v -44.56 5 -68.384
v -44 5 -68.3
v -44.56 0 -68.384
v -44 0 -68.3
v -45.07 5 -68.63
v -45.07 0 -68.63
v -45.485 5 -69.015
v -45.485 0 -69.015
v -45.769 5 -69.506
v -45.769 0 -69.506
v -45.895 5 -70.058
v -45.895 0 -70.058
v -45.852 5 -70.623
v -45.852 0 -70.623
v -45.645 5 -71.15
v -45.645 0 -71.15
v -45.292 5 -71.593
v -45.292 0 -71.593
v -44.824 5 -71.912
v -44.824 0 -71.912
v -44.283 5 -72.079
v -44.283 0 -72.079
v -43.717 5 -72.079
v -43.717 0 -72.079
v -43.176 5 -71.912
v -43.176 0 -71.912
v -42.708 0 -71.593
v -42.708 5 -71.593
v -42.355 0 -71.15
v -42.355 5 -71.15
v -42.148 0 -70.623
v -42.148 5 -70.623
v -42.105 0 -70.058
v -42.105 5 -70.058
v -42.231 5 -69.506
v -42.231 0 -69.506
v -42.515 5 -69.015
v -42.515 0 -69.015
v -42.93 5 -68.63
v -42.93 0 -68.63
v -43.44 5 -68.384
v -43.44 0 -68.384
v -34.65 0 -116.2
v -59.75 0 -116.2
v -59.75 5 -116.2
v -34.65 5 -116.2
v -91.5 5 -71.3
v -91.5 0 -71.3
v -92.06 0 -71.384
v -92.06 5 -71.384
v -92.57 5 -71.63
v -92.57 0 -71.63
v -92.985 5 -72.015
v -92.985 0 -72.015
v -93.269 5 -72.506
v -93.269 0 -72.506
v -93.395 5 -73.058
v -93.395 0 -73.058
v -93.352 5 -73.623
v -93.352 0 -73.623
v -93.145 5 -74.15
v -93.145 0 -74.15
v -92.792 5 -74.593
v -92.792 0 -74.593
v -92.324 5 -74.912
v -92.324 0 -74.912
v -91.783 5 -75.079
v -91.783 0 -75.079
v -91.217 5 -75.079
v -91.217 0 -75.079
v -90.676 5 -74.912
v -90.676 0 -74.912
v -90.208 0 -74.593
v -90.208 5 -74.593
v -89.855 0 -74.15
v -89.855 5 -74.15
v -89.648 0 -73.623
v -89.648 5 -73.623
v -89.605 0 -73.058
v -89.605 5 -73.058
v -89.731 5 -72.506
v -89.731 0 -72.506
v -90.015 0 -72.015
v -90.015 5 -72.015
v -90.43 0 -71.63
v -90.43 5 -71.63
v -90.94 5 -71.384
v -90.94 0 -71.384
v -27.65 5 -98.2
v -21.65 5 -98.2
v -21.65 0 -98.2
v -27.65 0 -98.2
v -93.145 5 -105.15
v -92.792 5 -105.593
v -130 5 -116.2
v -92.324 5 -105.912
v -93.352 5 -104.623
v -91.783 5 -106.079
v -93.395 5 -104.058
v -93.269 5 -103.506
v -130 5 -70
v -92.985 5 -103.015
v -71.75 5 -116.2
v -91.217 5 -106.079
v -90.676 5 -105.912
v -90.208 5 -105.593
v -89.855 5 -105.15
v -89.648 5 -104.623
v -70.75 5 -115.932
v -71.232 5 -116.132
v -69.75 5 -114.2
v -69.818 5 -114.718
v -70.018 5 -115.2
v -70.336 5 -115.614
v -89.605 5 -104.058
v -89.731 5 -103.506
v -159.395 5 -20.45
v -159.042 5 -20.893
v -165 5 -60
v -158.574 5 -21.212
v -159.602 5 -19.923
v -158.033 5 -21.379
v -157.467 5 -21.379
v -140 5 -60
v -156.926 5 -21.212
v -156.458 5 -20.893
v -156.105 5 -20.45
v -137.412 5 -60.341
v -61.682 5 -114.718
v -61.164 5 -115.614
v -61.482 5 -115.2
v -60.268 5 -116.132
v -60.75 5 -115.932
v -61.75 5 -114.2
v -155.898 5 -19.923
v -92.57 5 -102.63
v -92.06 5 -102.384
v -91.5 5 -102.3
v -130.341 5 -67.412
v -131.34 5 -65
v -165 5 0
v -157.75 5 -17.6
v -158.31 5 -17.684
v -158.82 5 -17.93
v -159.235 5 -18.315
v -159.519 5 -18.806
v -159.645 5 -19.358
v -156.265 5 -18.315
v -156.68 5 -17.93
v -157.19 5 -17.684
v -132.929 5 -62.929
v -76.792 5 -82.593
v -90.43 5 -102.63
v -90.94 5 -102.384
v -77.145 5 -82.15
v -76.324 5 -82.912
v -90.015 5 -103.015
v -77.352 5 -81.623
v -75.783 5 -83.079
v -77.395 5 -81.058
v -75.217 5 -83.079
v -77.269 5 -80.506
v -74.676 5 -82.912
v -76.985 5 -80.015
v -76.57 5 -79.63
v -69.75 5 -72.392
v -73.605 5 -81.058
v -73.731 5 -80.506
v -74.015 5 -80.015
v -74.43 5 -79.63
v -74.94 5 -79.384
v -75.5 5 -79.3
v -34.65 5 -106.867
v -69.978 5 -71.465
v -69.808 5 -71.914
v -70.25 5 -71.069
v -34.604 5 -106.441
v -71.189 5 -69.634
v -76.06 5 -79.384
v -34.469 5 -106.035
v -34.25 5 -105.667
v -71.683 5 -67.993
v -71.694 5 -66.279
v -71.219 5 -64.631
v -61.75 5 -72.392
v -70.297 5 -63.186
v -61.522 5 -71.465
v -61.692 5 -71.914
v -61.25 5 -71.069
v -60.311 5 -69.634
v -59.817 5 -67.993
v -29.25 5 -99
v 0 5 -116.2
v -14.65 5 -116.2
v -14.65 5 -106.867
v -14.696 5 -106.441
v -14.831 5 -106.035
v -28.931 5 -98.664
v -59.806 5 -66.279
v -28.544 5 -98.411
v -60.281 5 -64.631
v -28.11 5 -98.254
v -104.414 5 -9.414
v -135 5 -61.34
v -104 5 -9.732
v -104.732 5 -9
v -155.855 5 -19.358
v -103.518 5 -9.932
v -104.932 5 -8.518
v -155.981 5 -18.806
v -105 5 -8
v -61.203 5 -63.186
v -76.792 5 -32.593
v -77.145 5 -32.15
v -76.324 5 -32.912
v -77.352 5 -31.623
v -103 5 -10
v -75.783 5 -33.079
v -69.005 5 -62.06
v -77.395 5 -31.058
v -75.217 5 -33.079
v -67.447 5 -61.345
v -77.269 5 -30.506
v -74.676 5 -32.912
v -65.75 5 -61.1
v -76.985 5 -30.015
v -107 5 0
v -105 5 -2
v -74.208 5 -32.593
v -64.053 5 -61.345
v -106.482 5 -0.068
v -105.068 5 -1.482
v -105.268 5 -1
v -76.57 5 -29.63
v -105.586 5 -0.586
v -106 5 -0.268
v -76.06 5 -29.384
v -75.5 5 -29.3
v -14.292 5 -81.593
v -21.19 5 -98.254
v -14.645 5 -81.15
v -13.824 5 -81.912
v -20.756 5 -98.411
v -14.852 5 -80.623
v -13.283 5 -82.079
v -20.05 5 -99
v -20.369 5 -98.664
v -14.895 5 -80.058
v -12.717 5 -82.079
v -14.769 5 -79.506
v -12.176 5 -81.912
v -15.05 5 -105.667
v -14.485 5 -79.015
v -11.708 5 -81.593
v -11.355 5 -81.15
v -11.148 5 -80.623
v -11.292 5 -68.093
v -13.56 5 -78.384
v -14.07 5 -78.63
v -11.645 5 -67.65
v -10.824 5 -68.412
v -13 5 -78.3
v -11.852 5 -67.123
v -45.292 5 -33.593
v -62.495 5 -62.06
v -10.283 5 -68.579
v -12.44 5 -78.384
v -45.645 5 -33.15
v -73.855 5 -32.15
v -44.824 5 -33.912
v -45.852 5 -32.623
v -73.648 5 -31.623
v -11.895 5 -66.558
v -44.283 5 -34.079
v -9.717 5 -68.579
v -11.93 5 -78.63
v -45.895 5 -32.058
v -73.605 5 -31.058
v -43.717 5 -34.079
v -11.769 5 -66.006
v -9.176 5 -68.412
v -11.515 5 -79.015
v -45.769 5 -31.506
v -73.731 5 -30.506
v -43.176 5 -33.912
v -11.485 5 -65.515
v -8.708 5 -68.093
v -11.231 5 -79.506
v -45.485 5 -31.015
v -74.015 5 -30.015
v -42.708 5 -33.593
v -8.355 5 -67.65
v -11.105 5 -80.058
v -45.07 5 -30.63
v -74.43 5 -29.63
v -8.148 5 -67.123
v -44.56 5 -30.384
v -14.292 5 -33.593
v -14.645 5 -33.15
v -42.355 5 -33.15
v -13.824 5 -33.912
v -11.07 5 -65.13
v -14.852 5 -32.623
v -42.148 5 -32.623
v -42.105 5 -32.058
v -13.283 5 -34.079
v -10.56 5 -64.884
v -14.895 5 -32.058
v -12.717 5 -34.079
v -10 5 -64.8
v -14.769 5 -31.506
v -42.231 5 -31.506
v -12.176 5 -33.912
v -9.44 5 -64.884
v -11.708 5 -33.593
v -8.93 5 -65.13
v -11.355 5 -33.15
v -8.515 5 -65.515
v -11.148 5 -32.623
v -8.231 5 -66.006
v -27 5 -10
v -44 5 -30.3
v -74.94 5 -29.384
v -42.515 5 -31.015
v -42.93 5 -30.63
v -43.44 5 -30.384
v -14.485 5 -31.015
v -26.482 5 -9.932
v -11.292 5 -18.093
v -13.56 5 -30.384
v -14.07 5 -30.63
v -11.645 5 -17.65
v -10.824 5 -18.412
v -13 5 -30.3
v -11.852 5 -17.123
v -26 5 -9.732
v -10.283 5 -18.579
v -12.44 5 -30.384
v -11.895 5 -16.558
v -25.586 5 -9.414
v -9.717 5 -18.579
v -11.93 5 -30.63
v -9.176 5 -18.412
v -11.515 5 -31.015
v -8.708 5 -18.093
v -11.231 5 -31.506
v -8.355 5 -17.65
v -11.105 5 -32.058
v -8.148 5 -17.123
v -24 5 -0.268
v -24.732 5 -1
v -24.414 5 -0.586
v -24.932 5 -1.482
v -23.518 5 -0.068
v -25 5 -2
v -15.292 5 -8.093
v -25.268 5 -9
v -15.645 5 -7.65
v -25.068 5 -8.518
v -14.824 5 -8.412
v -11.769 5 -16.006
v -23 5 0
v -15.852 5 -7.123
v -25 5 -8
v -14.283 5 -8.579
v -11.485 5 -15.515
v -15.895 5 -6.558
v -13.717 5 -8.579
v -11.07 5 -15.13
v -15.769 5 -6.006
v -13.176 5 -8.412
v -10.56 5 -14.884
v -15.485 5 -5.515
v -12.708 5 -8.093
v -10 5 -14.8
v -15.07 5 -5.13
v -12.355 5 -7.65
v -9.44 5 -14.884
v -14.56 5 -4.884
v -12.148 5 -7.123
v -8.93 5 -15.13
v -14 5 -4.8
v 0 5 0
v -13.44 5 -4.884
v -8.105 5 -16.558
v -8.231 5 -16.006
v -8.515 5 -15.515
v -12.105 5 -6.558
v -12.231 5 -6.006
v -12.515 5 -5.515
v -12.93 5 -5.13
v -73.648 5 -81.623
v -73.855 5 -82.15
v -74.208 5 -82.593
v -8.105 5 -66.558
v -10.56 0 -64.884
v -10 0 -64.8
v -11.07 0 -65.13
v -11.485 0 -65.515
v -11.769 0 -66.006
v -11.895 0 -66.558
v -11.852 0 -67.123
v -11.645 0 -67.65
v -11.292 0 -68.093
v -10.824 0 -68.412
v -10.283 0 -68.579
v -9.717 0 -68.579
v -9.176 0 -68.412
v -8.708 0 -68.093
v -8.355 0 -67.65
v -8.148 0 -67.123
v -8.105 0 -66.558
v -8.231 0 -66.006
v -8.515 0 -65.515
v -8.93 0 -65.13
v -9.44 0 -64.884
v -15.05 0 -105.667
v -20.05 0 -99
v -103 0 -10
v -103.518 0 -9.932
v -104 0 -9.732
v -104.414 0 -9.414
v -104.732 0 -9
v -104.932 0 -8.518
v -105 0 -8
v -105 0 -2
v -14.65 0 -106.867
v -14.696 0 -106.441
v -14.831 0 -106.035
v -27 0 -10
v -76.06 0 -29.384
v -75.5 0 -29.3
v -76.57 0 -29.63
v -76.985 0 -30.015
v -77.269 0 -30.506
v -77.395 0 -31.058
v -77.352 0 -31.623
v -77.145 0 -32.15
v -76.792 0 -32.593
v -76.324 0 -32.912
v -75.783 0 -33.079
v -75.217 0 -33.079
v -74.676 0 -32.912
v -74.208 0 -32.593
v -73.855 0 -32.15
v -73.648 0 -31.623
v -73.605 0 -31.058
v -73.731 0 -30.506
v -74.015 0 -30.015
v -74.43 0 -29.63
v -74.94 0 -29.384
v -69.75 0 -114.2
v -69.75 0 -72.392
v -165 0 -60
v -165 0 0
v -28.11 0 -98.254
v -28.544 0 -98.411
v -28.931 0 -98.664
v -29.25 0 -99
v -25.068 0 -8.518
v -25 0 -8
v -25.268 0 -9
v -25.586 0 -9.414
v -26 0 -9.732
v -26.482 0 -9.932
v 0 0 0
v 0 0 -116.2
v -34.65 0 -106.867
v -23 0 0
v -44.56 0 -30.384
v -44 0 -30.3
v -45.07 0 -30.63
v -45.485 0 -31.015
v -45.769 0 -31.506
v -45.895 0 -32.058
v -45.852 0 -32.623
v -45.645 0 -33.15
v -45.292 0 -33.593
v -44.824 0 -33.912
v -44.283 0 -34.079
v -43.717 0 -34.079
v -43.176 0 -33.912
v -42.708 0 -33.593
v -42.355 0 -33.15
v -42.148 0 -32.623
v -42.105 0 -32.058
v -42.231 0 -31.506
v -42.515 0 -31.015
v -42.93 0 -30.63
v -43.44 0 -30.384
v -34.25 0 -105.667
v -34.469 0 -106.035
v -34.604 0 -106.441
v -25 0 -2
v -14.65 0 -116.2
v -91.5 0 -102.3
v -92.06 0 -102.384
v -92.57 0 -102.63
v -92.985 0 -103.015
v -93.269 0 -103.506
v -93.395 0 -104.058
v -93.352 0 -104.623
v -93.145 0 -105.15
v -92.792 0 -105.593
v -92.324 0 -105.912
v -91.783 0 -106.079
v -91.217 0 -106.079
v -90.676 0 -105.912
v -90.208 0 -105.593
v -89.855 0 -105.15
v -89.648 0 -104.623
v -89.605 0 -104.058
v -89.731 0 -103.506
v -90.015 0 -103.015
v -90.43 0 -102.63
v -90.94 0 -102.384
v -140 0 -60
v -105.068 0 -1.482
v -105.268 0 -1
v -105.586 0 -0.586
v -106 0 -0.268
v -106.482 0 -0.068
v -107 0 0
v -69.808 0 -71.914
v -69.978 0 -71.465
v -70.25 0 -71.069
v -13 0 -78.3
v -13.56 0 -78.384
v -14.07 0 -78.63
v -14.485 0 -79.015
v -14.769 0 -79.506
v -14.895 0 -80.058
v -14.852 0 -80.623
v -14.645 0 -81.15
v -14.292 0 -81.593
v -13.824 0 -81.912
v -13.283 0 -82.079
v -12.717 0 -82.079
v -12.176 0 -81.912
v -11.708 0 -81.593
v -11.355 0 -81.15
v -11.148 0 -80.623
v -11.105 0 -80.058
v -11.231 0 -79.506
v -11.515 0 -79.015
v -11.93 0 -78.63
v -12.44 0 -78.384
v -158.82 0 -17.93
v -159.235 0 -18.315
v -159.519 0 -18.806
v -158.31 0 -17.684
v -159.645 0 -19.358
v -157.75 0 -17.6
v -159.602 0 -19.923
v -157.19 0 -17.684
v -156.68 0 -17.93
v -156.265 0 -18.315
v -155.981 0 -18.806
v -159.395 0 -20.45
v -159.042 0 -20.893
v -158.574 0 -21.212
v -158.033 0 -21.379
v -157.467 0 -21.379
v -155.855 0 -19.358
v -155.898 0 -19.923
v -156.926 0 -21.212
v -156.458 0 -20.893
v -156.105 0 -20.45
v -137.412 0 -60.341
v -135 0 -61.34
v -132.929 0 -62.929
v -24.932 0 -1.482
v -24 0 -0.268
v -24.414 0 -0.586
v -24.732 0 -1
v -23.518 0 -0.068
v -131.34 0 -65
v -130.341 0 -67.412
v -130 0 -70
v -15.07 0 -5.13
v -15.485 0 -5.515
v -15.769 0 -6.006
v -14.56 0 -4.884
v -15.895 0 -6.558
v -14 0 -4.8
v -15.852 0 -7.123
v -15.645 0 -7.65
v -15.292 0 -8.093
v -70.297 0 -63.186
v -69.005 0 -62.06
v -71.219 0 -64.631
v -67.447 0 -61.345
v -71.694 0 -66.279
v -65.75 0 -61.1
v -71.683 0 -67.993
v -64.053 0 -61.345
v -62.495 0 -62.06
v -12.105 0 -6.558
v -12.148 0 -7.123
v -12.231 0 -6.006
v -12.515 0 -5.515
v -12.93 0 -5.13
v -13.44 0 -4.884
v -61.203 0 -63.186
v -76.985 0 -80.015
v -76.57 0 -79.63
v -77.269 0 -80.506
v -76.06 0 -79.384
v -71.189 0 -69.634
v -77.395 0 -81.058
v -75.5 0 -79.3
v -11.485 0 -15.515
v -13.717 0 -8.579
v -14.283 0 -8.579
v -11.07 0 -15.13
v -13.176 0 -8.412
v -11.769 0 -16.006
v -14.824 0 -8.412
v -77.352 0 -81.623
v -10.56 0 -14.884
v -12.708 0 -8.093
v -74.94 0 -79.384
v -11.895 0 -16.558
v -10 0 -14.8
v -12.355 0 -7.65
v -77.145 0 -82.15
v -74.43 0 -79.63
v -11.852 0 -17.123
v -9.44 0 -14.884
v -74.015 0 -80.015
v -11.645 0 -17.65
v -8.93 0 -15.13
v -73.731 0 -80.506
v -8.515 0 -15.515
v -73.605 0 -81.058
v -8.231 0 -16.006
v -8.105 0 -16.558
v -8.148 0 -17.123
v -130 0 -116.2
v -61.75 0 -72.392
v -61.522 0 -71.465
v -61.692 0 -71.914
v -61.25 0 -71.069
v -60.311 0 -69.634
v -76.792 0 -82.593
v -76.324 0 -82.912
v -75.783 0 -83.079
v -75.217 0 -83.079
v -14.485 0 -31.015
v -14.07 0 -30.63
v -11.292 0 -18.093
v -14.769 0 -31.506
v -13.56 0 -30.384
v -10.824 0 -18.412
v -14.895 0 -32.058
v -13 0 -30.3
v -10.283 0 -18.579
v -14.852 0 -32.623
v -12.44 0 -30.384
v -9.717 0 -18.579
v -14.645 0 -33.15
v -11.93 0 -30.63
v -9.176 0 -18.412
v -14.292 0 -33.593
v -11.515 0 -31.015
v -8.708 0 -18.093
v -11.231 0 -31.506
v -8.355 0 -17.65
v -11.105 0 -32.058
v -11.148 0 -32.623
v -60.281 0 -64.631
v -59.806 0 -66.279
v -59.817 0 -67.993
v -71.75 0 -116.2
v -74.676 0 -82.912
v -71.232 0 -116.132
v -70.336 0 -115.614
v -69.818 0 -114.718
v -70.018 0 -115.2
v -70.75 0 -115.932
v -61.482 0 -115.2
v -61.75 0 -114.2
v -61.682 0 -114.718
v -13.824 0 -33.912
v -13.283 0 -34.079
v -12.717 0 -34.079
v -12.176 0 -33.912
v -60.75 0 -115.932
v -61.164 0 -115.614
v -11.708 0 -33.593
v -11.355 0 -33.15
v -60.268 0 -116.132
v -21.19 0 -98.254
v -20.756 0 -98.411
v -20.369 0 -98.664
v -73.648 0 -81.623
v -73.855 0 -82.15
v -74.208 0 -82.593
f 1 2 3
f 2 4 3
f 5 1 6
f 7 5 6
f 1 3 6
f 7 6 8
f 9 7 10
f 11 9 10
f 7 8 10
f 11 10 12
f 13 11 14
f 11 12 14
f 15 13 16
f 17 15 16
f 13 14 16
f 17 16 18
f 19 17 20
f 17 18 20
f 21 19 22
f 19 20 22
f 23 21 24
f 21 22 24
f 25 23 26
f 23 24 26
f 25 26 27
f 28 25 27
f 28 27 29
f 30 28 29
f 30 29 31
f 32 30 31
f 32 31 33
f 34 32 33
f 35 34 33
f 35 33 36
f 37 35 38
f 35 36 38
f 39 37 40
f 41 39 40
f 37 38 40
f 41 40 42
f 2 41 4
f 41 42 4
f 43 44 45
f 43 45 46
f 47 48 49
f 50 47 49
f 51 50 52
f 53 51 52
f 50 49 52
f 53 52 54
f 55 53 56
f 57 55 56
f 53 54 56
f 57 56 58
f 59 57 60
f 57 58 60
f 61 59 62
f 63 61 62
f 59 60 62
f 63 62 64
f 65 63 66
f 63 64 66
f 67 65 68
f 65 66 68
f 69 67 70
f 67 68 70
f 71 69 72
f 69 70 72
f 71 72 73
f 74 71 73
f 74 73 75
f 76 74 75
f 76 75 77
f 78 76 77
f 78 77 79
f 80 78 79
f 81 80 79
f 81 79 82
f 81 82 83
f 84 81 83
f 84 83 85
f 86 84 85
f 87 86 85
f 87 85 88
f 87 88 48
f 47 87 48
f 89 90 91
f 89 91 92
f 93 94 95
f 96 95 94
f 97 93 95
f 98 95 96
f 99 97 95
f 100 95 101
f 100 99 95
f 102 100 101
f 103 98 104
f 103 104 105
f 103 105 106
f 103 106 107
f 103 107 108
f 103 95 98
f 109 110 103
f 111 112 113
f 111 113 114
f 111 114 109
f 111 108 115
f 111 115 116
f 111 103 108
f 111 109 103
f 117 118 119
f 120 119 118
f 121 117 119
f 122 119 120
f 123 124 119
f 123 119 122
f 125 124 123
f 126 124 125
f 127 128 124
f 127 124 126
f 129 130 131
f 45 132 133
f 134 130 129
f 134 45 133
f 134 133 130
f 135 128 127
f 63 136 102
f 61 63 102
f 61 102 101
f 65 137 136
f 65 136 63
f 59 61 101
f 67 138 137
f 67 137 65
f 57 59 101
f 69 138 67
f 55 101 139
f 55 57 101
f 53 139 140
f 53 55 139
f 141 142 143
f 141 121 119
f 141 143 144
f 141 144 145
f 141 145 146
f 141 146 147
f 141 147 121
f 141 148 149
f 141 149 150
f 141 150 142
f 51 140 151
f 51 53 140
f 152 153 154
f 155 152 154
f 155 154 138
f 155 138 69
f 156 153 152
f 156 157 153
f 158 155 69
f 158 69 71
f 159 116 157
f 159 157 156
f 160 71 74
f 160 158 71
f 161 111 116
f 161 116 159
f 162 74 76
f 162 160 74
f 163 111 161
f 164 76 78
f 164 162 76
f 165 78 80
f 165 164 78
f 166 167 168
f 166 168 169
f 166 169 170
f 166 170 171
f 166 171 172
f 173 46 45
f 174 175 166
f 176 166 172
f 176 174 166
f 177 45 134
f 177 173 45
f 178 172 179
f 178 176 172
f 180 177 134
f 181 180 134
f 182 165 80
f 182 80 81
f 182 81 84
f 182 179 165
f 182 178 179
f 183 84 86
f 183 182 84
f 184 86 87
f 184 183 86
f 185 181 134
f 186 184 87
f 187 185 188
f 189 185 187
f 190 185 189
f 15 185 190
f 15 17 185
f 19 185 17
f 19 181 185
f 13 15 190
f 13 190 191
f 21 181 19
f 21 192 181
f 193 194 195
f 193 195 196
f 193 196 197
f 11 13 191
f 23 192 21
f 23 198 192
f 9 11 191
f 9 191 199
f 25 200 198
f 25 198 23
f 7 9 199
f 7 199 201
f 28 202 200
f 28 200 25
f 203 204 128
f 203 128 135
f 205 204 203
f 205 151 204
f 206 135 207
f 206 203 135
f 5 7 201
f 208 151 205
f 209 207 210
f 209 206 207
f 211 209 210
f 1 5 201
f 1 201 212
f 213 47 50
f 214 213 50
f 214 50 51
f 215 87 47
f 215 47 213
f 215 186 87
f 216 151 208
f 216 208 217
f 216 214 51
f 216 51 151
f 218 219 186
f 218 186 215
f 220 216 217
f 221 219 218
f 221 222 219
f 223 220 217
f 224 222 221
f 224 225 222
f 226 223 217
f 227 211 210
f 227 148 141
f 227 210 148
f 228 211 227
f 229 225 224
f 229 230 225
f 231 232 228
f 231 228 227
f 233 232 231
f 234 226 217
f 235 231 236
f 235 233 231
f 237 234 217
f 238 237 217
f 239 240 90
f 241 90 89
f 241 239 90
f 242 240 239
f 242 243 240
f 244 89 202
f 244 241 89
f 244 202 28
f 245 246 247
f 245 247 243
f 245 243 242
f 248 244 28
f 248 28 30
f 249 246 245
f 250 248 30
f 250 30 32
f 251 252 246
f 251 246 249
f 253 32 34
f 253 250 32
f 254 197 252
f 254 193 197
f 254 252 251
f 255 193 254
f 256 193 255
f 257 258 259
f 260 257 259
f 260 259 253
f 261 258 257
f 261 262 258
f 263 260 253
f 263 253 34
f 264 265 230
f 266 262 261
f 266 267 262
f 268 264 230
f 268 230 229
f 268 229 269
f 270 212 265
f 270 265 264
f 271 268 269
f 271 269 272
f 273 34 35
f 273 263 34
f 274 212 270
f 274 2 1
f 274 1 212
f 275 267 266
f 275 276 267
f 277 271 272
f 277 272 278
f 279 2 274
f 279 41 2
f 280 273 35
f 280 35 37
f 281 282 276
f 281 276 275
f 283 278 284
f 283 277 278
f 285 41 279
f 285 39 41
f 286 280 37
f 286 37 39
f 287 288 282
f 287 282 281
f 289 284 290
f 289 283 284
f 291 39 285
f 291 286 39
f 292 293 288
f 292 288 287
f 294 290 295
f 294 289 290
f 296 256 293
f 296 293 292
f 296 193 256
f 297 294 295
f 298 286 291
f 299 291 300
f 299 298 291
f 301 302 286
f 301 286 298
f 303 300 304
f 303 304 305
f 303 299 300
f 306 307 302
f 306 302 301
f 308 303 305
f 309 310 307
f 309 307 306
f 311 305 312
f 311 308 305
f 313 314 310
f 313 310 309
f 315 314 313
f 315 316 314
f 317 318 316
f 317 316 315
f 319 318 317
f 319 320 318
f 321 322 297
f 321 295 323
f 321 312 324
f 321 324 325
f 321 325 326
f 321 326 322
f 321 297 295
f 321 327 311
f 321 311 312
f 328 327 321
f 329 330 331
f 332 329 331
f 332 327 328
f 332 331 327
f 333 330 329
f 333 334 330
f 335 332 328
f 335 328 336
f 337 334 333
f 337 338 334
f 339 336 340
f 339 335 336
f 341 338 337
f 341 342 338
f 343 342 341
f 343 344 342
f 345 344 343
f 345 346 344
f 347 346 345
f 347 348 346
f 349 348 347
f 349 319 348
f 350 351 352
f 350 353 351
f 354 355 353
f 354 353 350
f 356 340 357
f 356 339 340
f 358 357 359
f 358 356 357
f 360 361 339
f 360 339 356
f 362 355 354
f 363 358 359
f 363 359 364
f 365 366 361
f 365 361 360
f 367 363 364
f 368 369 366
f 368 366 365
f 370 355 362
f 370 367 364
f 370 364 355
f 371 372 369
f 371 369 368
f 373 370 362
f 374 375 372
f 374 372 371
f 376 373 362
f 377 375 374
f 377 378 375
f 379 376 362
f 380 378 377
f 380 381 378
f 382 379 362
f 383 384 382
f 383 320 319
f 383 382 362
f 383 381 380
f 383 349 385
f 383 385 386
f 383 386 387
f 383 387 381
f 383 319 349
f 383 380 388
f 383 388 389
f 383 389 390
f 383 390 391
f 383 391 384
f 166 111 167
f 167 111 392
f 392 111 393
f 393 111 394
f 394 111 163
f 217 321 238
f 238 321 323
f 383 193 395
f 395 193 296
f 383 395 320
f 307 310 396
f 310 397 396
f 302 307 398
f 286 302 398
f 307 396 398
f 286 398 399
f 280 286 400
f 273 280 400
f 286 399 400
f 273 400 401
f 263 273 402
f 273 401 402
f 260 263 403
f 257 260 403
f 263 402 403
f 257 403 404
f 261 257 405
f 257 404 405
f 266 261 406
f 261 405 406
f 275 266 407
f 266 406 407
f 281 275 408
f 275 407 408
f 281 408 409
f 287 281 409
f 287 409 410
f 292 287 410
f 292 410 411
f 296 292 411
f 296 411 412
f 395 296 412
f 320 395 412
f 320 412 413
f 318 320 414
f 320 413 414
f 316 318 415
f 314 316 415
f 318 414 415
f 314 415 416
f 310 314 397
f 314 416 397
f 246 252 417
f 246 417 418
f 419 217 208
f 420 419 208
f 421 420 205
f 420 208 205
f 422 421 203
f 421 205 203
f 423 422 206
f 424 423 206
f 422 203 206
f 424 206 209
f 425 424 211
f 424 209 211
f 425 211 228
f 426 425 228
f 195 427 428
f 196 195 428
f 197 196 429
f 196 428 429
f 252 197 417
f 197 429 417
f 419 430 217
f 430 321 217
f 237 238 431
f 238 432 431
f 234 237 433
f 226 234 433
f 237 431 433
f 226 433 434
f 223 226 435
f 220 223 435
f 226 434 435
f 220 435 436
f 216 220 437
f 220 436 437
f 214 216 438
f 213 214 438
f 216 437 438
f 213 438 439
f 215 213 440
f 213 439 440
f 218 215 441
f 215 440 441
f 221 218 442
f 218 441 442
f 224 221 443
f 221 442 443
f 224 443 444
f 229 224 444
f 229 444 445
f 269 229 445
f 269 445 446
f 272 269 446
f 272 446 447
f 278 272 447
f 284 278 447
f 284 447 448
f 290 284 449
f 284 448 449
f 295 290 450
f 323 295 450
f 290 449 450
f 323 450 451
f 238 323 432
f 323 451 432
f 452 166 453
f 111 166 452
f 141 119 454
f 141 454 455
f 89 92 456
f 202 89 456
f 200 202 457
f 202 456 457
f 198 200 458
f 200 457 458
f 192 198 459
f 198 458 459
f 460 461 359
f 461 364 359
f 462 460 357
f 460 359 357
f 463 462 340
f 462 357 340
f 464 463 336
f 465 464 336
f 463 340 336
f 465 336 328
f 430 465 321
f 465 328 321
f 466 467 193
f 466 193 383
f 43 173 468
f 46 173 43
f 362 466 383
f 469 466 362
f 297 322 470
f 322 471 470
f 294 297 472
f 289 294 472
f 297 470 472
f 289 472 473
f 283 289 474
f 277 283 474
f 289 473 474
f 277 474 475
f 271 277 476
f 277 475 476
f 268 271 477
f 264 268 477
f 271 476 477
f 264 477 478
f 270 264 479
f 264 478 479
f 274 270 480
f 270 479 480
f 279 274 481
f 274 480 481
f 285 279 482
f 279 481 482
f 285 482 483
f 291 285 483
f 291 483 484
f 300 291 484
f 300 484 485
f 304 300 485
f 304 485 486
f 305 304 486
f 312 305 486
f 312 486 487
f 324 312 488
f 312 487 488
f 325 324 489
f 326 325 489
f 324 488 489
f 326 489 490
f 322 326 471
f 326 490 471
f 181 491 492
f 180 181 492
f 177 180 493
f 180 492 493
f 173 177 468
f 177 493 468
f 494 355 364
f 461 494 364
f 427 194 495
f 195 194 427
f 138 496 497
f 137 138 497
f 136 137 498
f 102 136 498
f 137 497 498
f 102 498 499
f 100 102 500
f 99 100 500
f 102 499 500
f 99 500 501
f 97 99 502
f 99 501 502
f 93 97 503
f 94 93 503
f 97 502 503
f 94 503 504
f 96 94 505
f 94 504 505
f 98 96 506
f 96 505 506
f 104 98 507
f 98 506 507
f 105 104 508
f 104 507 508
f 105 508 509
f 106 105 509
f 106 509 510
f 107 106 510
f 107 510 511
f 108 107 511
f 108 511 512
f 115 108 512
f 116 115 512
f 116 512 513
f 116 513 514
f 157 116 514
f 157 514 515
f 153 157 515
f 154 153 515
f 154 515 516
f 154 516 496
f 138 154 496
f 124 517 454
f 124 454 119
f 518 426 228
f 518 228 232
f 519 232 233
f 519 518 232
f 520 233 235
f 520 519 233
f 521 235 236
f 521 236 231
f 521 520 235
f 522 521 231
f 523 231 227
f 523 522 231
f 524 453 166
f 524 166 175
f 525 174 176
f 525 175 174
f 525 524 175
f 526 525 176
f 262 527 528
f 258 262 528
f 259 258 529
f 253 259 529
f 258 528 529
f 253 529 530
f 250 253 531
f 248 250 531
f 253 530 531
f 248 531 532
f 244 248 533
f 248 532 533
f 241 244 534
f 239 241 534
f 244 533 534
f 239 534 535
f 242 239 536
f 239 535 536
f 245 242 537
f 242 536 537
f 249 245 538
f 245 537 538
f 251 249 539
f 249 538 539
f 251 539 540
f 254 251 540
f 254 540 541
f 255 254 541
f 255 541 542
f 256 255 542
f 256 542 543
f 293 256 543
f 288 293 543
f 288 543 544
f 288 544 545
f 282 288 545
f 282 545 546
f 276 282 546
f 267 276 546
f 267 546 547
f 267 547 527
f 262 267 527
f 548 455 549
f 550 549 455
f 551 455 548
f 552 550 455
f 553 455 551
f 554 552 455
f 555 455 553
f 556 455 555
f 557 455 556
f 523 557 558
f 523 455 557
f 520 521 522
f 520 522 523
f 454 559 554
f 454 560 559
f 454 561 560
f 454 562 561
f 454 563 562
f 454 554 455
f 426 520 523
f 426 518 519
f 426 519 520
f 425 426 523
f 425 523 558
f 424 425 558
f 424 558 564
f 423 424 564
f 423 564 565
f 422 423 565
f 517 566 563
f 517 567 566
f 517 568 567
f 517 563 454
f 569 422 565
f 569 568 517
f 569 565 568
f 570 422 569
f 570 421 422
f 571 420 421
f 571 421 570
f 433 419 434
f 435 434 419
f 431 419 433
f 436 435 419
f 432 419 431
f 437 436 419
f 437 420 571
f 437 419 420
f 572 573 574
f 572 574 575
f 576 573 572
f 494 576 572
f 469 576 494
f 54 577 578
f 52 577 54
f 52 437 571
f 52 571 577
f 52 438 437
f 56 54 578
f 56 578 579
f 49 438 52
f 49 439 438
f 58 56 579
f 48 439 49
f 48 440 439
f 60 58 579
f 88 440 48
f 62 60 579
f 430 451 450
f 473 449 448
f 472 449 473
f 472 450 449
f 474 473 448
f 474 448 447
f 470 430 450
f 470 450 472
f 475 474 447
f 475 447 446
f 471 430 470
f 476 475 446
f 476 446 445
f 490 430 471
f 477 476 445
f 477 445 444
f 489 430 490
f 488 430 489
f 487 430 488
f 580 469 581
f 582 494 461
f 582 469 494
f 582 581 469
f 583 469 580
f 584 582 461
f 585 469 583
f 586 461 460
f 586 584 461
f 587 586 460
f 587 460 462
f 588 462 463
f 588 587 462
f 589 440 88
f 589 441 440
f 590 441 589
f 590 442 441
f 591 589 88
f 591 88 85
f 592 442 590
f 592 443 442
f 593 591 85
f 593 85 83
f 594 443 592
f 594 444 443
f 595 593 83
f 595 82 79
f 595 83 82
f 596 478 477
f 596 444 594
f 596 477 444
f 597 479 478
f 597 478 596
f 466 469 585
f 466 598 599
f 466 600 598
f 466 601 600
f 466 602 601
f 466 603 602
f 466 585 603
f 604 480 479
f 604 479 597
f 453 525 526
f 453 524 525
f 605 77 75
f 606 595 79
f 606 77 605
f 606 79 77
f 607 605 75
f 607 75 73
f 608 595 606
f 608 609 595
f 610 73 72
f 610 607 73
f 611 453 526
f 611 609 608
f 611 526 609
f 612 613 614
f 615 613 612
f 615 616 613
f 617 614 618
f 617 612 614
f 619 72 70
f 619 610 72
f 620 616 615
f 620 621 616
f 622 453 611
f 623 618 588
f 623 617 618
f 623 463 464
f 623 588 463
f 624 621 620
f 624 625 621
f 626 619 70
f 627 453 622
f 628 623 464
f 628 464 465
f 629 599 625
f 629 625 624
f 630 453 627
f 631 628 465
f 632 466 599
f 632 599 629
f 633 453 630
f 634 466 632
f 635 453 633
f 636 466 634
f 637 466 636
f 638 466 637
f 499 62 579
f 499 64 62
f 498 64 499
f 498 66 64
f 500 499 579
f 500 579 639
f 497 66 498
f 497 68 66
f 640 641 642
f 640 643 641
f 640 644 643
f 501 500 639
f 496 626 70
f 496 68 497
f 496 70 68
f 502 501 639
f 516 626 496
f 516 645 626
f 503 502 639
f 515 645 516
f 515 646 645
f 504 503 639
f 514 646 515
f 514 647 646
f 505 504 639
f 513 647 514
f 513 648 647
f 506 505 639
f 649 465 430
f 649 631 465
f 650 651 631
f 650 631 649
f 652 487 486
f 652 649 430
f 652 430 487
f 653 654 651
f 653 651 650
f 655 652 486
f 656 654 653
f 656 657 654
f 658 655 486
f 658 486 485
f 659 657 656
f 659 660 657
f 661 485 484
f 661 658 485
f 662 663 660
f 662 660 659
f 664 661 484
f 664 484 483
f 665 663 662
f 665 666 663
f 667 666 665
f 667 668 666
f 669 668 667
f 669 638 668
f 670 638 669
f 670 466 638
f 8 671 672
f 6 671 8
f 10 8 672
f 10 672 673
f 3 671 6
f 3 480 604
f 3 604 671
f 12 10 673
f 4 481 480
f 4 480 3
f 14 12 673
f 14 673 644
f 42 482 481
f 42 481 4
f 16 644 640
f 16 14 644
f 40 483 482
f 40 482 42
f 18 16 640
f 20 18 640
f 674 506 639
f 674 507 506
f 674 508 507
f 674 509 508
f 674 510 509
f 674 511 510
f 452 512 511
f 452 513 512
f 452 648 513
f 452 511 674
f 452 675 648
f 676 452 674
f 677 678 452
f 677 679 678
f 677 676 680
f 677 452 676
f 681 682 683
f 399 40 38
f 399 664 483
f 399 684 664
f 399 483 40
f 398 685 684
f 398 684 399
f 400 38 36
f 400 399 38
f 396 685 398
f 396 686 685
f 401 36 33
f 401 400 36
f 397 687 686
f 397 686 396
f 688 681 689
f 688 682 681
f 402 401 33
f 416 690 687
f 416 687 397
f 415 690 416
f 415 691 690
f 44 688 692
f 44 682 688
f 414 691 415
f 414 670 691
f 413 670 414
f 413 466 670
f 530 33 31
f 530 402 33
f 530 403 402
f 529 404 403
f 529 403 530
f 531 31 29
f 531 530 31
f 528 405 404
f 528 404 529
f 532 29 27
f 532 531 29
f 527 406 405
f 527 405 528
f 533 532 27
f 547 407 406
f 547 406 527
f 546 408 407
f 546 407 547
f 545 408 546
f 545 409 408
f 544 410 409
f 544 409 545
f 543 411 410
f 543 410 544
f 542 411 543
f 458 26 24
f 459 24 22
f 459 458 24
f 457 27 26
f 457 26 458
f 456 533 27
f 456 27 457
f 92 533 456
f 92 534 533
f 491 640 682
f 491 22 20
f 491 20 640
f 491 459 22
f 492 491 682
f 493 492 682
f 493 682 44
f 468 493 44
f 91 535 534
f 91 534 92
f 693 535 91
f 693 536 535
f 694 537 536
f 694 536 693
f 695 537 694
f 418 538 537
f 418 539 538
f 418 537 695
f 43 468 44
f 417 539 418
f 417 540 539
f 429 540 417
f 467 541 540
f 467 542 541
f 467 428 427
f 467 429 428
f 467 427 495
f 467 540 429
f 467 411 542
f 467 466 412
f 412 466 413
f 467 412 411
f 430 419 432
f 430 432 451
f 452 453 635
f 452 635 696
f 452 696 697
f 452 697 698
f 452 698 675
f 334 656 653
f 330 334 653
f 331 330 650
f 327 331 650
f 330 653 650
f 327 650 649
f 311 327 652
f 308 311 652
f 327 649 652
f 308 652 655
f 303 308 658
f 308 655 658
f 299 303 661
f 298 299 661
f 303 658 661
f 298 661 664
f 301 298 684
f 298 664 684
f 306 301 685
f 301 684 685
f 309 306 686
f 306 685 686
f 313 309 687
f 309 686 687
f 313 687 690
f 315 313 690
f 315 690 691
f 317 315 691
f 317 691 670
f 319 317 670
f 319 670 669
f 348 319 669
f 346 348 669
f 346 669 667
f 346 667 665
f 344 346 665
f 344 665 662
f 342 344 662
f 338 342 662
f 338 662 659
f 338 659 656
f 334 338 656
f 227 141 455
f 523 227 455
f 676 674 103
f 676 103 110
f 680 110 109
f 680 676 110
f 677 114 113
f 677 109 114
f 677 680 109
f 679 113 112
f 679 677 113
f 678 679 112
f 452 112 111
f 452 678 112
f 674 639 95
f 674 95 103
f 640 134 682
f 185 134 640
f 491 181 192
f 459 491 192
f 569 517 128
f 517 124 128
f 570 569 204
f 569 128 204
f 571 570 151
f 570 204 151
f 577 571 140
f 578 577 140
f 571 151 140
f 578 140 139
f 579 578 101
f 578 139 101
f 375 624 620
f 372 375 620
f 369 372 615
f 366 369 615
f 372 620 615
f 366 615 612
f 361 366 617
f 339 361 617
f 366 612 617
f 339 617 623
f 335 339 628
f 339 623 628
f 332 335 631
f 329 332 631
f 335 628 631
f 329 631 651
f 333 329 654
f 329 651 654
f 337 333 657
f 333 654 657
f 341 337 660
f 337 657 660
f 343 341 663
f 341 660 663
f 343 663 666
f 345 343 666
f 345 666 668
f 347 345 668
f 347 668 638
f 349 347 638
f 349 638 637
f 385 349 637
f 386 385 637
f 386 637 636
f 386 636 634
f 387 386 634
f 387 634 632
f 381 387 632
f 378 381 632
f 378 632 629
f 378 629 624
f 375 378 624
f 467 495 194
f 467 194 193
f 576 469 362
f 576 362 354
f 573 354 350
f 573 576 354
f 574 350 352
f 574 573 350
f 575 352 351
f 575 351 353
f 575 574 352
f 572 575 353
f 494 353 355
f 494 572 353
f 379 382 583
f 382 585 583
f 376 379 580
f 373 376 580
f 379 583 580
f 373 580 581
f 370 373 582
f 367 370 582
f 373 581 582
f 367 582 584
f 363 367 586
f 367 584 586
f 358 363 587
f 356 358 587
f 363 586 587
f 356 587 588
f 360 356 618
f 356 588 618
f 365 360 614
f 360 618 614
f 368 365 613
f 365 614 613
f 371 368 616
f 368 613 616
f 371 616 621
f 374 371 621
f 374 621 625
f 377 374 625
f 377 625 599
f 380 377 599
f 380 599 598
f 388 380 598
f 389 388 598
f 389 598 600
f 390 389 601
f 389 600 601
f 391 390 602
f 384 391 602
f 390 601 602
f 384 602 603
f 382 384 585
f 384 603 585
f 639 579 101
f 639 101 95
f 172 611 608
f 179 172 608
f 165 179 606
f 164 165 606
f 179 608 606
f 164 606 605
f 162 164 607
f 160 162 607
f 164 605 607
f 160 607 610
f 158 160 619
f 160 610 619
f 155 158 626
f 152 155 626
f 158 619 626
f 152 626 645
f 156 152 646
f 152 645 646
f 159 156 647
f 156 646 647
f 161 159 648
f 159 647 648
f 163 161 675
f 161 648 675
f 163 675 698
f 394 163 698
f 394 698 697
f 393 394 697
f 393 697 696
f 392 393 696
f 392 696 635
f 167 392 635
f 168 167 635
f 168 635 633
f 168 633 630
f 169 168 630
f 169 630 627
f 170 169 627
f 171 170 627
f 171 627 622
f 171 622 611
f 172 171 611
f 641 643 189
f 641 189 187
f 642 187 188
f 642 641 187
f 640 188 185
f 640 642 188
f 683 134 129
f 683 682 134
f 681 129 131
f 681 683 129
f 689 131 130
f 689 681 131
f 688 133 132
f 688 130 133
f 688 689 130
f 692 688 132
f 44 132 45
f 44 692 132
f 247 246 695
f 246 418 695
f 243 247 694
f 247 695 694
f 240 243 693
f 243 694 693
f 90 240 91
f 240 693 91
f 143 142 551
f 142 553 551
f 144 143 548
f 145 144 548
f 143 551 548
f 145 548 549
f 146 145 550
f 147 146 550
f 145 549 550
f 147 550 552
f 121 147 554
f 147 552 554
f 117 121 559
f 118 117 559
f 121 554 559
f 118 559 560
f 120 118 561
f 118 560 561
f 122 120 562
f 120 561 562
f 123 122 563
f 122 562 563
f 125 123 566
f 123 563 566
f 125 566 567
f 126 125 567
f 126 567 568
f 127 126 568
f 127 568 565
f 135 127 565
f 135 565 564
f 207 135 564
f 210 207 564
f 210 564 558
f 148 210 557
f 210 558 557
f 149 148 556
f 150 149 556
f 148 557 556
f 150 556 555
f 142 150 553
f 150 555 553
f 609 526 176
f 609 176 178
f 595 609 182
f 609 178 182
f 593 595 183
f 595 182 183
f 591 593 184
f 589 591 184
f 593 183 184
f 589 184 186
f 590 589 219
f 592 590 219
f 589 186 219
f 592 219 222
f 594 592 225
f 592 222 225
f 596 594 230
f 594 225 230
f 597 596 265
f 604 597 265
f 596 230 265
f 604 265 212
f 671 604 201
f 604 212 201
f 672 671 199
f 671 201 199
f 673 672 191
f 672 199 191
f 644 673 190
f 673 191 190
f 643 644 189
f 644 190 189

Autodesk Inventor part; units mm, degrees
ref_plane "YZ Plane" through (0, 0, 0) normal (1, 0, 0) x (0, 1, 0)
ref_plane "XZ Plane" through (0, 0, 0) normal (0, 1, 0) x (-1, 0, 0)
ref_plane "XY Plane" through (0, 0, 0) normal (0, 0, 1) x (1, 0, 0)
sketch "Sketch1" plane through (0, 0, 0) normal (0, 1, 0) x (-1, 0, 0)
  line L0 (0, 0) -> (130, 0)
  line L1 (130, 0) -> (130, -116.2)
  line L2 (130, -116.2) -> (0, -116.2)
  line L3 (0, -116.2) -> (0, 0)
  dimension "d0" = 130
  dimension "d1" = 116.2
extrude "Extrusion1" add sketch "Sketch1" along normal blind 5
sketch "Sketch2" plane through (0, 5, 0) normal (0, 1, 0) x (1, 0, 0)
  line L0 (-10, -25.3077) -> (-10, 177.8334) construction
  line L1 (0, 0) -> (0, 116.2) construction
  line L2 (-130, 0) -> (0, 0) construction
  line L3 (-47, -19.5328) -> (-47, 162.8865) construction
  line L4 (0, 116.2) -> (-130, 116.2) construction
  point P0 (-10, 16.7)
  point P1 (-10, 66.7)
  point P2 (-47, 111.7)
  point P3 (-47, 43.95)
  point P4 (-47, 17.95)
  dimension "d4" = 10
  dimension "d5" = 16.7
  dimension "d6" = 50
  dimension "d7" = 47
  dimension "d8" = 4.5
  dimension "d9" = 72.25
  dimension "d10" = 98.25
hole "Hole1" at (-10, 5, -16.7) at (-10, 5, -66.7) direction (0, -1, 0) diameter 3.8 end through all
sketch "Sketch3" plane through (0, 5, 0) normal (0, 1, 0) x (1, 0, 0)
  line L0 (-105, 0) -> (-25, 0)
  line L1 (-25, 0) -> (-25, 8)
  line L2 (-27, 10) -> (-103, 10)
  line L3 (-105, 8) -> (-105, 0)
  line L4 (-130, 116.2) -> (-130, 0) projected
  line L5 (0, 0) -> (0, 116.2) projected
  arc A0 (-103, 10) -> (-105, 8) centre (-103, 8) ccw
  arc A1 (-25, 8) -> (-27, 10) centre (-27, 8) ccw
  dimension "d18" = 10
  dimension "d19" = 25
  dimension "d20" = 25
  dimension "d21" = 2
extrude "Extrusion2" cut sketch "Sketch3" against normal blind 5
fillet "Fillet1" radius 2 2 edges at (-105, 2.5, 0) (-25, 2.5, 0)
sketch "Sketch4" plane through (0, 5, 0) normal (0, 1, 0) x (1, 0, 0)
  circle A0 centre (-65.75, 67.1) radius 6
  line L0 (0, 0) -> (0, 116.2) projected
  line L1 (-23, 0) -> (0, 0) projected
  dimension "d25" = 12
  dimension "d26" = 65.75
  dimension "d27" = 67.1
extrude "Extrusion3" cut sketch "Sketch4" against normal blind 5
sketch "Sketch5" plane through (0, 5, 0) normal (0, 1, 0) x (1, 0, 0)
  line L0 (-91.5, 130.6682) -> (-91.5, -27.2079) construction
  line L1 (0, 0) -> (0, 116.2) construction
  line L2 (0, 116.2) -> (-130, 116.2) construction
  point P0 (-91.5, 104.2)
  point P1 (-91.5, 73.2)
  dimension "d30" = 91.5
  dimension "d31" = 12
  dimension "d32" = 43
hole "Hole2" at (-91.5, 5, -104.2) at (-91.5, 5, -73.2) direction (0, -1, 0) diameter 3.8 end through all
sketch "Sketch6" plane through (0, 5, 0) normal (0, 1, 0) x (1, 0, 0)
  line L0 (-13, 148.9997) -> (-13, -38.8385) construction
  line L1 (0, 0) -> (0, 116.2) projected
  line L2 (0, 116.2) -> (-130, 116.2) projected
  line L3 (-44, 144.1508) -> (-44, -38.8385) construction
  line L4 (-14, 12.9628) -> (-14, -11.5017) construction
  line L5 (-23, 0) -> (0, 0) construction
  point P0 (-13, 80.2)
  point P1 (-13, 32.2)
  point P2 (-44, 70.2)
  point P3 (-44, 32.2)
  point P4 (-14, 6.7)
  dimension "d40" = 13
  dimension "d41" = 36
  dimension "d42" = 84
  dimension "d50" = 44
  dimension "d51" = 46
  dimension "d52" = 84
  dimension "d53" = 14
  dimension "d54" = 6.7
hole "Hole3" at (-13, 5, -80.2) at (-13, 5, -32.2) at (-44, 5, -32.2) at (-44, 5, -70.2) at (-14, 5, -6.7) direction (0, -1, 0) diameter 3.8 end through all
sketch "Sketch7" plane through (-130, 0, -116.2) normal (-1, 0, 0) x (0, 0, 1)
  line L0 (116.2, 0) -> (56.2, 0)
  line L1 (56.2, 0) -> (56.2, 5)
  line L2 (56.2, 5) -> (116.2, 5)
  line L3 (116.2, 5) -> (116.2, 0)
  dimension "d55" = 60
  dimension "d56" = 5
extrude "Extrusion4" add sketch "Sketch7" along normal blind 35
fillet "Fillet2" radius 10 1 edges at (-130, 2.5, -60)
sketch "Sketch8" plane through (0, 5, 0) normal (0, 1, 0) x (1, 0, 0)
  line L0 (-107, 0) -> (-165, 0) projected
  line L1 (-165, 0) -> (-165, 60) projected
  point P0 (0, 0)
  point P1 (-157.75, 19.5)
  dimension "d60" = 19.5
  dimension "d61" = 7.25
hole "Hole4" at (-157.75, 5, -19.5) direction (0, -1, 0) diameter 3.8 end through all
sketch "Sketch9" plane through (0, 5, 0) normal (0, 1, 0) x (1, 0, 0)
  line L0 (-24.65, 135.1246) -> (-24.65, 98.3323) construction
  line L1 (0, 0) -> (0, 116.2) projected
  line L2 (-34.65, 134.2) -> (-14.65, 134.2)
  line L3 (-14.65, 134.2) -> (-14.65, 98.2)
  line L4 (-14.65, 98.2) -> (-34.65, 98.2)
  line L5 (-34.65, 98.2) -> (-34.65, 134.2)
  line L6 (0, 116.2) -> (-130, 116.2) projected
  line L7 (-34.65, 134.2) -> (-14.65, 98.2) construction
  line L8 (-14.65, 134.2) -> (-34.65, 98.2) construction
  line L9 (-14.65, 106.2) -> (-20.65, 98.2)
  line L10 (-34.65, 106.2) -> (-28.65, 98.2)
  line L11 (-34.65, 116.2) -> (-14.65, 116.2)
  point P0 (-24.65, 116.2)
  dimension "d69" = 24.65
  dimension "d70" = 20
  dimension "d71" = 36
  dimension "d72" = 10
  dimension "d73" = 8
extrude "Extrusion5" cut sketch "Sketch9" against normal through all contours L6 L3 L9 L4 L10 L5
fillet "Fillet3" radius 2 4 edges at (-34.65, 2.5, -106.2) (-28.65, 2.5, -98.2) (-20.65, 2.5, -98.2) (-14.65, 2.5, -106.2)
sketch "Sketch10" plane through (0, 5, 0) normal (0, 1, 0) x (1, 0, 0)
  line L0 (-34.65, 106.8667) -> (-34.65, 116.2) projected
  line L1 (-34.65, 116.2) -> (-130, 116.2) projected
  line L2 (-130, 116.2) -> (-130, 70) projected
  arc A0 (-140, 60) -> (-130, 70) centre (-140, 70) ccw projected
  line L3 (-140, 60) -> (-165, 60) projected
  line L4 (-165, 0) -> (-165, 60) projected
  line L5 (-107, 0) -> (-165, 0) projected
  arc A1 (-107, 0) -> (-105, 2) centre (-107, 2) ccw projected
  line L6 (-105, 2) -> (-105, 8) projected
  arc A2 (-103, 10) -> (-105, 8) centre (-103, 8) ccw projected
  line L7 (-103, 10) -> (-27, 10) projected
  arc A3 (-25, 8) -> (-27, 10) centre (-27, 8) ccw projected
  line L8 (-25, 8) -> (-25, 2) projected
  arc A4 (-25, 2) -> (-23, 0) centre (-23, 2) ccw projected
  line L9 (-23, 0) -> (0, 0) projected
  line L10 (0, 0) -> (0, 116.2) projected
  line L11 (0, 116.2) -> (-14.65, 116.2) projected
  line L12 (-14.65, 116.2) -> (-14.65, 106.8667) projected
  arc A5 (-15.05, 105.6667) -> (-14.65, 106.8667) centre (-16.65, 106.8667) ccw projected
  line L13 (-15.05, 105.6667) -> (-20.05, 99) projected
  arc A6 (-21.65, 98.2) -> (-20.05, 99) centre (-21.65, 100.2) ccw projected
  line L14 (-21.65, 98.2) -> (-27.65, 98.2) projected
  arc A7 (-29.25, 99) -> (-27.65, 98.2) centre (-27.65, 100.2) ccw projected
  line L15 (-29.25, 99) -> (-34.25, 105.6667) projected
  arc A8 (-34.65, 106.8667) -> (-34.25, 105.6667) centre (-32.65, 106.8667) ccw projected
  circle A9 centre (-157.75, 19.5) radius 1.9 projected
  circle A10 centre (-44, 70.2) radius 1.9 projected
  circle A11 centre (-13, 32.2) radius 1.9 projected
  circle A12 centre (-13, 80.2) radius 1.9 projected
  circle A13 centre (-44, 32.2) radius 1.9 projected
  circle A14 centre (-14, 6.7) radius 1.9 projected
  circle A15 centre (-91.5, 104.2) radius 1.9 projected
  circle A16 centre (-91.5, 73.2) radius 1.9 projected
  circle A17 centre (-65.75, 67.1) radius 6 projected
  circle A18 centre (-10, 16.7) radius 1.9 projected
  circle A19 centre (-10, 66.7) radius 1.9 projected
  line L16 (-65.75, 187.4389) -> (-65.75, -19.4667) construction
  line L17 (-34.65, 116.2) -> (-130, 116.2) projected
  circle A20 centre (-65.75, 67.1) radius 6 projected
  line L18 (-69.75, 116.2) -> (-61.75, 116.2)
  line L19 (-61.75, 116.2) -> (-61.75, 71.5721)
  line L20 (-61.75, 71.5721) -> (-69.75, 71.5721)
  line L21 (-69.75, 71.5721) -> (-69.75, 116.2)
  dimension "d77" = 8
extrude "Extrusion6" cut sketch "Sketch10" against normal through all contours L19 A17 L21 L1
fillet "Fillet4" radius 2 4 edges at (-69.75, 2.5, -116.2) (-61.75, 2.5, -116.2) (-69.75, 2.5, -71.5721) (-61.75, 2.5, -71.5721)
sketch "Sketch11" plane through (0, 5, 0) normal (0, 1, 0) x (1, 0, 0)
  line L0 (-75.5, 139.1066) -> (-75.5, -104.8745) construction
  line L1 (0, 0) -> (0, 116.2) construction
  line L2 (-71.75, 116.2) -> (-130, 116.2) construction
  point P0 (-75.5, 31.2)
  point P1 (-75.5, 81.2)
  dimension "d81" = 75.5
  dimension "d82" = 35
  dimension "d83" = 85
hole "Hole5" at (-75.5, 5, -31.2) at (-75.5, 5, -81.2) direction (0, -1, 0) diameter 3.8 end through all
properties part number "Bottle side plate"
